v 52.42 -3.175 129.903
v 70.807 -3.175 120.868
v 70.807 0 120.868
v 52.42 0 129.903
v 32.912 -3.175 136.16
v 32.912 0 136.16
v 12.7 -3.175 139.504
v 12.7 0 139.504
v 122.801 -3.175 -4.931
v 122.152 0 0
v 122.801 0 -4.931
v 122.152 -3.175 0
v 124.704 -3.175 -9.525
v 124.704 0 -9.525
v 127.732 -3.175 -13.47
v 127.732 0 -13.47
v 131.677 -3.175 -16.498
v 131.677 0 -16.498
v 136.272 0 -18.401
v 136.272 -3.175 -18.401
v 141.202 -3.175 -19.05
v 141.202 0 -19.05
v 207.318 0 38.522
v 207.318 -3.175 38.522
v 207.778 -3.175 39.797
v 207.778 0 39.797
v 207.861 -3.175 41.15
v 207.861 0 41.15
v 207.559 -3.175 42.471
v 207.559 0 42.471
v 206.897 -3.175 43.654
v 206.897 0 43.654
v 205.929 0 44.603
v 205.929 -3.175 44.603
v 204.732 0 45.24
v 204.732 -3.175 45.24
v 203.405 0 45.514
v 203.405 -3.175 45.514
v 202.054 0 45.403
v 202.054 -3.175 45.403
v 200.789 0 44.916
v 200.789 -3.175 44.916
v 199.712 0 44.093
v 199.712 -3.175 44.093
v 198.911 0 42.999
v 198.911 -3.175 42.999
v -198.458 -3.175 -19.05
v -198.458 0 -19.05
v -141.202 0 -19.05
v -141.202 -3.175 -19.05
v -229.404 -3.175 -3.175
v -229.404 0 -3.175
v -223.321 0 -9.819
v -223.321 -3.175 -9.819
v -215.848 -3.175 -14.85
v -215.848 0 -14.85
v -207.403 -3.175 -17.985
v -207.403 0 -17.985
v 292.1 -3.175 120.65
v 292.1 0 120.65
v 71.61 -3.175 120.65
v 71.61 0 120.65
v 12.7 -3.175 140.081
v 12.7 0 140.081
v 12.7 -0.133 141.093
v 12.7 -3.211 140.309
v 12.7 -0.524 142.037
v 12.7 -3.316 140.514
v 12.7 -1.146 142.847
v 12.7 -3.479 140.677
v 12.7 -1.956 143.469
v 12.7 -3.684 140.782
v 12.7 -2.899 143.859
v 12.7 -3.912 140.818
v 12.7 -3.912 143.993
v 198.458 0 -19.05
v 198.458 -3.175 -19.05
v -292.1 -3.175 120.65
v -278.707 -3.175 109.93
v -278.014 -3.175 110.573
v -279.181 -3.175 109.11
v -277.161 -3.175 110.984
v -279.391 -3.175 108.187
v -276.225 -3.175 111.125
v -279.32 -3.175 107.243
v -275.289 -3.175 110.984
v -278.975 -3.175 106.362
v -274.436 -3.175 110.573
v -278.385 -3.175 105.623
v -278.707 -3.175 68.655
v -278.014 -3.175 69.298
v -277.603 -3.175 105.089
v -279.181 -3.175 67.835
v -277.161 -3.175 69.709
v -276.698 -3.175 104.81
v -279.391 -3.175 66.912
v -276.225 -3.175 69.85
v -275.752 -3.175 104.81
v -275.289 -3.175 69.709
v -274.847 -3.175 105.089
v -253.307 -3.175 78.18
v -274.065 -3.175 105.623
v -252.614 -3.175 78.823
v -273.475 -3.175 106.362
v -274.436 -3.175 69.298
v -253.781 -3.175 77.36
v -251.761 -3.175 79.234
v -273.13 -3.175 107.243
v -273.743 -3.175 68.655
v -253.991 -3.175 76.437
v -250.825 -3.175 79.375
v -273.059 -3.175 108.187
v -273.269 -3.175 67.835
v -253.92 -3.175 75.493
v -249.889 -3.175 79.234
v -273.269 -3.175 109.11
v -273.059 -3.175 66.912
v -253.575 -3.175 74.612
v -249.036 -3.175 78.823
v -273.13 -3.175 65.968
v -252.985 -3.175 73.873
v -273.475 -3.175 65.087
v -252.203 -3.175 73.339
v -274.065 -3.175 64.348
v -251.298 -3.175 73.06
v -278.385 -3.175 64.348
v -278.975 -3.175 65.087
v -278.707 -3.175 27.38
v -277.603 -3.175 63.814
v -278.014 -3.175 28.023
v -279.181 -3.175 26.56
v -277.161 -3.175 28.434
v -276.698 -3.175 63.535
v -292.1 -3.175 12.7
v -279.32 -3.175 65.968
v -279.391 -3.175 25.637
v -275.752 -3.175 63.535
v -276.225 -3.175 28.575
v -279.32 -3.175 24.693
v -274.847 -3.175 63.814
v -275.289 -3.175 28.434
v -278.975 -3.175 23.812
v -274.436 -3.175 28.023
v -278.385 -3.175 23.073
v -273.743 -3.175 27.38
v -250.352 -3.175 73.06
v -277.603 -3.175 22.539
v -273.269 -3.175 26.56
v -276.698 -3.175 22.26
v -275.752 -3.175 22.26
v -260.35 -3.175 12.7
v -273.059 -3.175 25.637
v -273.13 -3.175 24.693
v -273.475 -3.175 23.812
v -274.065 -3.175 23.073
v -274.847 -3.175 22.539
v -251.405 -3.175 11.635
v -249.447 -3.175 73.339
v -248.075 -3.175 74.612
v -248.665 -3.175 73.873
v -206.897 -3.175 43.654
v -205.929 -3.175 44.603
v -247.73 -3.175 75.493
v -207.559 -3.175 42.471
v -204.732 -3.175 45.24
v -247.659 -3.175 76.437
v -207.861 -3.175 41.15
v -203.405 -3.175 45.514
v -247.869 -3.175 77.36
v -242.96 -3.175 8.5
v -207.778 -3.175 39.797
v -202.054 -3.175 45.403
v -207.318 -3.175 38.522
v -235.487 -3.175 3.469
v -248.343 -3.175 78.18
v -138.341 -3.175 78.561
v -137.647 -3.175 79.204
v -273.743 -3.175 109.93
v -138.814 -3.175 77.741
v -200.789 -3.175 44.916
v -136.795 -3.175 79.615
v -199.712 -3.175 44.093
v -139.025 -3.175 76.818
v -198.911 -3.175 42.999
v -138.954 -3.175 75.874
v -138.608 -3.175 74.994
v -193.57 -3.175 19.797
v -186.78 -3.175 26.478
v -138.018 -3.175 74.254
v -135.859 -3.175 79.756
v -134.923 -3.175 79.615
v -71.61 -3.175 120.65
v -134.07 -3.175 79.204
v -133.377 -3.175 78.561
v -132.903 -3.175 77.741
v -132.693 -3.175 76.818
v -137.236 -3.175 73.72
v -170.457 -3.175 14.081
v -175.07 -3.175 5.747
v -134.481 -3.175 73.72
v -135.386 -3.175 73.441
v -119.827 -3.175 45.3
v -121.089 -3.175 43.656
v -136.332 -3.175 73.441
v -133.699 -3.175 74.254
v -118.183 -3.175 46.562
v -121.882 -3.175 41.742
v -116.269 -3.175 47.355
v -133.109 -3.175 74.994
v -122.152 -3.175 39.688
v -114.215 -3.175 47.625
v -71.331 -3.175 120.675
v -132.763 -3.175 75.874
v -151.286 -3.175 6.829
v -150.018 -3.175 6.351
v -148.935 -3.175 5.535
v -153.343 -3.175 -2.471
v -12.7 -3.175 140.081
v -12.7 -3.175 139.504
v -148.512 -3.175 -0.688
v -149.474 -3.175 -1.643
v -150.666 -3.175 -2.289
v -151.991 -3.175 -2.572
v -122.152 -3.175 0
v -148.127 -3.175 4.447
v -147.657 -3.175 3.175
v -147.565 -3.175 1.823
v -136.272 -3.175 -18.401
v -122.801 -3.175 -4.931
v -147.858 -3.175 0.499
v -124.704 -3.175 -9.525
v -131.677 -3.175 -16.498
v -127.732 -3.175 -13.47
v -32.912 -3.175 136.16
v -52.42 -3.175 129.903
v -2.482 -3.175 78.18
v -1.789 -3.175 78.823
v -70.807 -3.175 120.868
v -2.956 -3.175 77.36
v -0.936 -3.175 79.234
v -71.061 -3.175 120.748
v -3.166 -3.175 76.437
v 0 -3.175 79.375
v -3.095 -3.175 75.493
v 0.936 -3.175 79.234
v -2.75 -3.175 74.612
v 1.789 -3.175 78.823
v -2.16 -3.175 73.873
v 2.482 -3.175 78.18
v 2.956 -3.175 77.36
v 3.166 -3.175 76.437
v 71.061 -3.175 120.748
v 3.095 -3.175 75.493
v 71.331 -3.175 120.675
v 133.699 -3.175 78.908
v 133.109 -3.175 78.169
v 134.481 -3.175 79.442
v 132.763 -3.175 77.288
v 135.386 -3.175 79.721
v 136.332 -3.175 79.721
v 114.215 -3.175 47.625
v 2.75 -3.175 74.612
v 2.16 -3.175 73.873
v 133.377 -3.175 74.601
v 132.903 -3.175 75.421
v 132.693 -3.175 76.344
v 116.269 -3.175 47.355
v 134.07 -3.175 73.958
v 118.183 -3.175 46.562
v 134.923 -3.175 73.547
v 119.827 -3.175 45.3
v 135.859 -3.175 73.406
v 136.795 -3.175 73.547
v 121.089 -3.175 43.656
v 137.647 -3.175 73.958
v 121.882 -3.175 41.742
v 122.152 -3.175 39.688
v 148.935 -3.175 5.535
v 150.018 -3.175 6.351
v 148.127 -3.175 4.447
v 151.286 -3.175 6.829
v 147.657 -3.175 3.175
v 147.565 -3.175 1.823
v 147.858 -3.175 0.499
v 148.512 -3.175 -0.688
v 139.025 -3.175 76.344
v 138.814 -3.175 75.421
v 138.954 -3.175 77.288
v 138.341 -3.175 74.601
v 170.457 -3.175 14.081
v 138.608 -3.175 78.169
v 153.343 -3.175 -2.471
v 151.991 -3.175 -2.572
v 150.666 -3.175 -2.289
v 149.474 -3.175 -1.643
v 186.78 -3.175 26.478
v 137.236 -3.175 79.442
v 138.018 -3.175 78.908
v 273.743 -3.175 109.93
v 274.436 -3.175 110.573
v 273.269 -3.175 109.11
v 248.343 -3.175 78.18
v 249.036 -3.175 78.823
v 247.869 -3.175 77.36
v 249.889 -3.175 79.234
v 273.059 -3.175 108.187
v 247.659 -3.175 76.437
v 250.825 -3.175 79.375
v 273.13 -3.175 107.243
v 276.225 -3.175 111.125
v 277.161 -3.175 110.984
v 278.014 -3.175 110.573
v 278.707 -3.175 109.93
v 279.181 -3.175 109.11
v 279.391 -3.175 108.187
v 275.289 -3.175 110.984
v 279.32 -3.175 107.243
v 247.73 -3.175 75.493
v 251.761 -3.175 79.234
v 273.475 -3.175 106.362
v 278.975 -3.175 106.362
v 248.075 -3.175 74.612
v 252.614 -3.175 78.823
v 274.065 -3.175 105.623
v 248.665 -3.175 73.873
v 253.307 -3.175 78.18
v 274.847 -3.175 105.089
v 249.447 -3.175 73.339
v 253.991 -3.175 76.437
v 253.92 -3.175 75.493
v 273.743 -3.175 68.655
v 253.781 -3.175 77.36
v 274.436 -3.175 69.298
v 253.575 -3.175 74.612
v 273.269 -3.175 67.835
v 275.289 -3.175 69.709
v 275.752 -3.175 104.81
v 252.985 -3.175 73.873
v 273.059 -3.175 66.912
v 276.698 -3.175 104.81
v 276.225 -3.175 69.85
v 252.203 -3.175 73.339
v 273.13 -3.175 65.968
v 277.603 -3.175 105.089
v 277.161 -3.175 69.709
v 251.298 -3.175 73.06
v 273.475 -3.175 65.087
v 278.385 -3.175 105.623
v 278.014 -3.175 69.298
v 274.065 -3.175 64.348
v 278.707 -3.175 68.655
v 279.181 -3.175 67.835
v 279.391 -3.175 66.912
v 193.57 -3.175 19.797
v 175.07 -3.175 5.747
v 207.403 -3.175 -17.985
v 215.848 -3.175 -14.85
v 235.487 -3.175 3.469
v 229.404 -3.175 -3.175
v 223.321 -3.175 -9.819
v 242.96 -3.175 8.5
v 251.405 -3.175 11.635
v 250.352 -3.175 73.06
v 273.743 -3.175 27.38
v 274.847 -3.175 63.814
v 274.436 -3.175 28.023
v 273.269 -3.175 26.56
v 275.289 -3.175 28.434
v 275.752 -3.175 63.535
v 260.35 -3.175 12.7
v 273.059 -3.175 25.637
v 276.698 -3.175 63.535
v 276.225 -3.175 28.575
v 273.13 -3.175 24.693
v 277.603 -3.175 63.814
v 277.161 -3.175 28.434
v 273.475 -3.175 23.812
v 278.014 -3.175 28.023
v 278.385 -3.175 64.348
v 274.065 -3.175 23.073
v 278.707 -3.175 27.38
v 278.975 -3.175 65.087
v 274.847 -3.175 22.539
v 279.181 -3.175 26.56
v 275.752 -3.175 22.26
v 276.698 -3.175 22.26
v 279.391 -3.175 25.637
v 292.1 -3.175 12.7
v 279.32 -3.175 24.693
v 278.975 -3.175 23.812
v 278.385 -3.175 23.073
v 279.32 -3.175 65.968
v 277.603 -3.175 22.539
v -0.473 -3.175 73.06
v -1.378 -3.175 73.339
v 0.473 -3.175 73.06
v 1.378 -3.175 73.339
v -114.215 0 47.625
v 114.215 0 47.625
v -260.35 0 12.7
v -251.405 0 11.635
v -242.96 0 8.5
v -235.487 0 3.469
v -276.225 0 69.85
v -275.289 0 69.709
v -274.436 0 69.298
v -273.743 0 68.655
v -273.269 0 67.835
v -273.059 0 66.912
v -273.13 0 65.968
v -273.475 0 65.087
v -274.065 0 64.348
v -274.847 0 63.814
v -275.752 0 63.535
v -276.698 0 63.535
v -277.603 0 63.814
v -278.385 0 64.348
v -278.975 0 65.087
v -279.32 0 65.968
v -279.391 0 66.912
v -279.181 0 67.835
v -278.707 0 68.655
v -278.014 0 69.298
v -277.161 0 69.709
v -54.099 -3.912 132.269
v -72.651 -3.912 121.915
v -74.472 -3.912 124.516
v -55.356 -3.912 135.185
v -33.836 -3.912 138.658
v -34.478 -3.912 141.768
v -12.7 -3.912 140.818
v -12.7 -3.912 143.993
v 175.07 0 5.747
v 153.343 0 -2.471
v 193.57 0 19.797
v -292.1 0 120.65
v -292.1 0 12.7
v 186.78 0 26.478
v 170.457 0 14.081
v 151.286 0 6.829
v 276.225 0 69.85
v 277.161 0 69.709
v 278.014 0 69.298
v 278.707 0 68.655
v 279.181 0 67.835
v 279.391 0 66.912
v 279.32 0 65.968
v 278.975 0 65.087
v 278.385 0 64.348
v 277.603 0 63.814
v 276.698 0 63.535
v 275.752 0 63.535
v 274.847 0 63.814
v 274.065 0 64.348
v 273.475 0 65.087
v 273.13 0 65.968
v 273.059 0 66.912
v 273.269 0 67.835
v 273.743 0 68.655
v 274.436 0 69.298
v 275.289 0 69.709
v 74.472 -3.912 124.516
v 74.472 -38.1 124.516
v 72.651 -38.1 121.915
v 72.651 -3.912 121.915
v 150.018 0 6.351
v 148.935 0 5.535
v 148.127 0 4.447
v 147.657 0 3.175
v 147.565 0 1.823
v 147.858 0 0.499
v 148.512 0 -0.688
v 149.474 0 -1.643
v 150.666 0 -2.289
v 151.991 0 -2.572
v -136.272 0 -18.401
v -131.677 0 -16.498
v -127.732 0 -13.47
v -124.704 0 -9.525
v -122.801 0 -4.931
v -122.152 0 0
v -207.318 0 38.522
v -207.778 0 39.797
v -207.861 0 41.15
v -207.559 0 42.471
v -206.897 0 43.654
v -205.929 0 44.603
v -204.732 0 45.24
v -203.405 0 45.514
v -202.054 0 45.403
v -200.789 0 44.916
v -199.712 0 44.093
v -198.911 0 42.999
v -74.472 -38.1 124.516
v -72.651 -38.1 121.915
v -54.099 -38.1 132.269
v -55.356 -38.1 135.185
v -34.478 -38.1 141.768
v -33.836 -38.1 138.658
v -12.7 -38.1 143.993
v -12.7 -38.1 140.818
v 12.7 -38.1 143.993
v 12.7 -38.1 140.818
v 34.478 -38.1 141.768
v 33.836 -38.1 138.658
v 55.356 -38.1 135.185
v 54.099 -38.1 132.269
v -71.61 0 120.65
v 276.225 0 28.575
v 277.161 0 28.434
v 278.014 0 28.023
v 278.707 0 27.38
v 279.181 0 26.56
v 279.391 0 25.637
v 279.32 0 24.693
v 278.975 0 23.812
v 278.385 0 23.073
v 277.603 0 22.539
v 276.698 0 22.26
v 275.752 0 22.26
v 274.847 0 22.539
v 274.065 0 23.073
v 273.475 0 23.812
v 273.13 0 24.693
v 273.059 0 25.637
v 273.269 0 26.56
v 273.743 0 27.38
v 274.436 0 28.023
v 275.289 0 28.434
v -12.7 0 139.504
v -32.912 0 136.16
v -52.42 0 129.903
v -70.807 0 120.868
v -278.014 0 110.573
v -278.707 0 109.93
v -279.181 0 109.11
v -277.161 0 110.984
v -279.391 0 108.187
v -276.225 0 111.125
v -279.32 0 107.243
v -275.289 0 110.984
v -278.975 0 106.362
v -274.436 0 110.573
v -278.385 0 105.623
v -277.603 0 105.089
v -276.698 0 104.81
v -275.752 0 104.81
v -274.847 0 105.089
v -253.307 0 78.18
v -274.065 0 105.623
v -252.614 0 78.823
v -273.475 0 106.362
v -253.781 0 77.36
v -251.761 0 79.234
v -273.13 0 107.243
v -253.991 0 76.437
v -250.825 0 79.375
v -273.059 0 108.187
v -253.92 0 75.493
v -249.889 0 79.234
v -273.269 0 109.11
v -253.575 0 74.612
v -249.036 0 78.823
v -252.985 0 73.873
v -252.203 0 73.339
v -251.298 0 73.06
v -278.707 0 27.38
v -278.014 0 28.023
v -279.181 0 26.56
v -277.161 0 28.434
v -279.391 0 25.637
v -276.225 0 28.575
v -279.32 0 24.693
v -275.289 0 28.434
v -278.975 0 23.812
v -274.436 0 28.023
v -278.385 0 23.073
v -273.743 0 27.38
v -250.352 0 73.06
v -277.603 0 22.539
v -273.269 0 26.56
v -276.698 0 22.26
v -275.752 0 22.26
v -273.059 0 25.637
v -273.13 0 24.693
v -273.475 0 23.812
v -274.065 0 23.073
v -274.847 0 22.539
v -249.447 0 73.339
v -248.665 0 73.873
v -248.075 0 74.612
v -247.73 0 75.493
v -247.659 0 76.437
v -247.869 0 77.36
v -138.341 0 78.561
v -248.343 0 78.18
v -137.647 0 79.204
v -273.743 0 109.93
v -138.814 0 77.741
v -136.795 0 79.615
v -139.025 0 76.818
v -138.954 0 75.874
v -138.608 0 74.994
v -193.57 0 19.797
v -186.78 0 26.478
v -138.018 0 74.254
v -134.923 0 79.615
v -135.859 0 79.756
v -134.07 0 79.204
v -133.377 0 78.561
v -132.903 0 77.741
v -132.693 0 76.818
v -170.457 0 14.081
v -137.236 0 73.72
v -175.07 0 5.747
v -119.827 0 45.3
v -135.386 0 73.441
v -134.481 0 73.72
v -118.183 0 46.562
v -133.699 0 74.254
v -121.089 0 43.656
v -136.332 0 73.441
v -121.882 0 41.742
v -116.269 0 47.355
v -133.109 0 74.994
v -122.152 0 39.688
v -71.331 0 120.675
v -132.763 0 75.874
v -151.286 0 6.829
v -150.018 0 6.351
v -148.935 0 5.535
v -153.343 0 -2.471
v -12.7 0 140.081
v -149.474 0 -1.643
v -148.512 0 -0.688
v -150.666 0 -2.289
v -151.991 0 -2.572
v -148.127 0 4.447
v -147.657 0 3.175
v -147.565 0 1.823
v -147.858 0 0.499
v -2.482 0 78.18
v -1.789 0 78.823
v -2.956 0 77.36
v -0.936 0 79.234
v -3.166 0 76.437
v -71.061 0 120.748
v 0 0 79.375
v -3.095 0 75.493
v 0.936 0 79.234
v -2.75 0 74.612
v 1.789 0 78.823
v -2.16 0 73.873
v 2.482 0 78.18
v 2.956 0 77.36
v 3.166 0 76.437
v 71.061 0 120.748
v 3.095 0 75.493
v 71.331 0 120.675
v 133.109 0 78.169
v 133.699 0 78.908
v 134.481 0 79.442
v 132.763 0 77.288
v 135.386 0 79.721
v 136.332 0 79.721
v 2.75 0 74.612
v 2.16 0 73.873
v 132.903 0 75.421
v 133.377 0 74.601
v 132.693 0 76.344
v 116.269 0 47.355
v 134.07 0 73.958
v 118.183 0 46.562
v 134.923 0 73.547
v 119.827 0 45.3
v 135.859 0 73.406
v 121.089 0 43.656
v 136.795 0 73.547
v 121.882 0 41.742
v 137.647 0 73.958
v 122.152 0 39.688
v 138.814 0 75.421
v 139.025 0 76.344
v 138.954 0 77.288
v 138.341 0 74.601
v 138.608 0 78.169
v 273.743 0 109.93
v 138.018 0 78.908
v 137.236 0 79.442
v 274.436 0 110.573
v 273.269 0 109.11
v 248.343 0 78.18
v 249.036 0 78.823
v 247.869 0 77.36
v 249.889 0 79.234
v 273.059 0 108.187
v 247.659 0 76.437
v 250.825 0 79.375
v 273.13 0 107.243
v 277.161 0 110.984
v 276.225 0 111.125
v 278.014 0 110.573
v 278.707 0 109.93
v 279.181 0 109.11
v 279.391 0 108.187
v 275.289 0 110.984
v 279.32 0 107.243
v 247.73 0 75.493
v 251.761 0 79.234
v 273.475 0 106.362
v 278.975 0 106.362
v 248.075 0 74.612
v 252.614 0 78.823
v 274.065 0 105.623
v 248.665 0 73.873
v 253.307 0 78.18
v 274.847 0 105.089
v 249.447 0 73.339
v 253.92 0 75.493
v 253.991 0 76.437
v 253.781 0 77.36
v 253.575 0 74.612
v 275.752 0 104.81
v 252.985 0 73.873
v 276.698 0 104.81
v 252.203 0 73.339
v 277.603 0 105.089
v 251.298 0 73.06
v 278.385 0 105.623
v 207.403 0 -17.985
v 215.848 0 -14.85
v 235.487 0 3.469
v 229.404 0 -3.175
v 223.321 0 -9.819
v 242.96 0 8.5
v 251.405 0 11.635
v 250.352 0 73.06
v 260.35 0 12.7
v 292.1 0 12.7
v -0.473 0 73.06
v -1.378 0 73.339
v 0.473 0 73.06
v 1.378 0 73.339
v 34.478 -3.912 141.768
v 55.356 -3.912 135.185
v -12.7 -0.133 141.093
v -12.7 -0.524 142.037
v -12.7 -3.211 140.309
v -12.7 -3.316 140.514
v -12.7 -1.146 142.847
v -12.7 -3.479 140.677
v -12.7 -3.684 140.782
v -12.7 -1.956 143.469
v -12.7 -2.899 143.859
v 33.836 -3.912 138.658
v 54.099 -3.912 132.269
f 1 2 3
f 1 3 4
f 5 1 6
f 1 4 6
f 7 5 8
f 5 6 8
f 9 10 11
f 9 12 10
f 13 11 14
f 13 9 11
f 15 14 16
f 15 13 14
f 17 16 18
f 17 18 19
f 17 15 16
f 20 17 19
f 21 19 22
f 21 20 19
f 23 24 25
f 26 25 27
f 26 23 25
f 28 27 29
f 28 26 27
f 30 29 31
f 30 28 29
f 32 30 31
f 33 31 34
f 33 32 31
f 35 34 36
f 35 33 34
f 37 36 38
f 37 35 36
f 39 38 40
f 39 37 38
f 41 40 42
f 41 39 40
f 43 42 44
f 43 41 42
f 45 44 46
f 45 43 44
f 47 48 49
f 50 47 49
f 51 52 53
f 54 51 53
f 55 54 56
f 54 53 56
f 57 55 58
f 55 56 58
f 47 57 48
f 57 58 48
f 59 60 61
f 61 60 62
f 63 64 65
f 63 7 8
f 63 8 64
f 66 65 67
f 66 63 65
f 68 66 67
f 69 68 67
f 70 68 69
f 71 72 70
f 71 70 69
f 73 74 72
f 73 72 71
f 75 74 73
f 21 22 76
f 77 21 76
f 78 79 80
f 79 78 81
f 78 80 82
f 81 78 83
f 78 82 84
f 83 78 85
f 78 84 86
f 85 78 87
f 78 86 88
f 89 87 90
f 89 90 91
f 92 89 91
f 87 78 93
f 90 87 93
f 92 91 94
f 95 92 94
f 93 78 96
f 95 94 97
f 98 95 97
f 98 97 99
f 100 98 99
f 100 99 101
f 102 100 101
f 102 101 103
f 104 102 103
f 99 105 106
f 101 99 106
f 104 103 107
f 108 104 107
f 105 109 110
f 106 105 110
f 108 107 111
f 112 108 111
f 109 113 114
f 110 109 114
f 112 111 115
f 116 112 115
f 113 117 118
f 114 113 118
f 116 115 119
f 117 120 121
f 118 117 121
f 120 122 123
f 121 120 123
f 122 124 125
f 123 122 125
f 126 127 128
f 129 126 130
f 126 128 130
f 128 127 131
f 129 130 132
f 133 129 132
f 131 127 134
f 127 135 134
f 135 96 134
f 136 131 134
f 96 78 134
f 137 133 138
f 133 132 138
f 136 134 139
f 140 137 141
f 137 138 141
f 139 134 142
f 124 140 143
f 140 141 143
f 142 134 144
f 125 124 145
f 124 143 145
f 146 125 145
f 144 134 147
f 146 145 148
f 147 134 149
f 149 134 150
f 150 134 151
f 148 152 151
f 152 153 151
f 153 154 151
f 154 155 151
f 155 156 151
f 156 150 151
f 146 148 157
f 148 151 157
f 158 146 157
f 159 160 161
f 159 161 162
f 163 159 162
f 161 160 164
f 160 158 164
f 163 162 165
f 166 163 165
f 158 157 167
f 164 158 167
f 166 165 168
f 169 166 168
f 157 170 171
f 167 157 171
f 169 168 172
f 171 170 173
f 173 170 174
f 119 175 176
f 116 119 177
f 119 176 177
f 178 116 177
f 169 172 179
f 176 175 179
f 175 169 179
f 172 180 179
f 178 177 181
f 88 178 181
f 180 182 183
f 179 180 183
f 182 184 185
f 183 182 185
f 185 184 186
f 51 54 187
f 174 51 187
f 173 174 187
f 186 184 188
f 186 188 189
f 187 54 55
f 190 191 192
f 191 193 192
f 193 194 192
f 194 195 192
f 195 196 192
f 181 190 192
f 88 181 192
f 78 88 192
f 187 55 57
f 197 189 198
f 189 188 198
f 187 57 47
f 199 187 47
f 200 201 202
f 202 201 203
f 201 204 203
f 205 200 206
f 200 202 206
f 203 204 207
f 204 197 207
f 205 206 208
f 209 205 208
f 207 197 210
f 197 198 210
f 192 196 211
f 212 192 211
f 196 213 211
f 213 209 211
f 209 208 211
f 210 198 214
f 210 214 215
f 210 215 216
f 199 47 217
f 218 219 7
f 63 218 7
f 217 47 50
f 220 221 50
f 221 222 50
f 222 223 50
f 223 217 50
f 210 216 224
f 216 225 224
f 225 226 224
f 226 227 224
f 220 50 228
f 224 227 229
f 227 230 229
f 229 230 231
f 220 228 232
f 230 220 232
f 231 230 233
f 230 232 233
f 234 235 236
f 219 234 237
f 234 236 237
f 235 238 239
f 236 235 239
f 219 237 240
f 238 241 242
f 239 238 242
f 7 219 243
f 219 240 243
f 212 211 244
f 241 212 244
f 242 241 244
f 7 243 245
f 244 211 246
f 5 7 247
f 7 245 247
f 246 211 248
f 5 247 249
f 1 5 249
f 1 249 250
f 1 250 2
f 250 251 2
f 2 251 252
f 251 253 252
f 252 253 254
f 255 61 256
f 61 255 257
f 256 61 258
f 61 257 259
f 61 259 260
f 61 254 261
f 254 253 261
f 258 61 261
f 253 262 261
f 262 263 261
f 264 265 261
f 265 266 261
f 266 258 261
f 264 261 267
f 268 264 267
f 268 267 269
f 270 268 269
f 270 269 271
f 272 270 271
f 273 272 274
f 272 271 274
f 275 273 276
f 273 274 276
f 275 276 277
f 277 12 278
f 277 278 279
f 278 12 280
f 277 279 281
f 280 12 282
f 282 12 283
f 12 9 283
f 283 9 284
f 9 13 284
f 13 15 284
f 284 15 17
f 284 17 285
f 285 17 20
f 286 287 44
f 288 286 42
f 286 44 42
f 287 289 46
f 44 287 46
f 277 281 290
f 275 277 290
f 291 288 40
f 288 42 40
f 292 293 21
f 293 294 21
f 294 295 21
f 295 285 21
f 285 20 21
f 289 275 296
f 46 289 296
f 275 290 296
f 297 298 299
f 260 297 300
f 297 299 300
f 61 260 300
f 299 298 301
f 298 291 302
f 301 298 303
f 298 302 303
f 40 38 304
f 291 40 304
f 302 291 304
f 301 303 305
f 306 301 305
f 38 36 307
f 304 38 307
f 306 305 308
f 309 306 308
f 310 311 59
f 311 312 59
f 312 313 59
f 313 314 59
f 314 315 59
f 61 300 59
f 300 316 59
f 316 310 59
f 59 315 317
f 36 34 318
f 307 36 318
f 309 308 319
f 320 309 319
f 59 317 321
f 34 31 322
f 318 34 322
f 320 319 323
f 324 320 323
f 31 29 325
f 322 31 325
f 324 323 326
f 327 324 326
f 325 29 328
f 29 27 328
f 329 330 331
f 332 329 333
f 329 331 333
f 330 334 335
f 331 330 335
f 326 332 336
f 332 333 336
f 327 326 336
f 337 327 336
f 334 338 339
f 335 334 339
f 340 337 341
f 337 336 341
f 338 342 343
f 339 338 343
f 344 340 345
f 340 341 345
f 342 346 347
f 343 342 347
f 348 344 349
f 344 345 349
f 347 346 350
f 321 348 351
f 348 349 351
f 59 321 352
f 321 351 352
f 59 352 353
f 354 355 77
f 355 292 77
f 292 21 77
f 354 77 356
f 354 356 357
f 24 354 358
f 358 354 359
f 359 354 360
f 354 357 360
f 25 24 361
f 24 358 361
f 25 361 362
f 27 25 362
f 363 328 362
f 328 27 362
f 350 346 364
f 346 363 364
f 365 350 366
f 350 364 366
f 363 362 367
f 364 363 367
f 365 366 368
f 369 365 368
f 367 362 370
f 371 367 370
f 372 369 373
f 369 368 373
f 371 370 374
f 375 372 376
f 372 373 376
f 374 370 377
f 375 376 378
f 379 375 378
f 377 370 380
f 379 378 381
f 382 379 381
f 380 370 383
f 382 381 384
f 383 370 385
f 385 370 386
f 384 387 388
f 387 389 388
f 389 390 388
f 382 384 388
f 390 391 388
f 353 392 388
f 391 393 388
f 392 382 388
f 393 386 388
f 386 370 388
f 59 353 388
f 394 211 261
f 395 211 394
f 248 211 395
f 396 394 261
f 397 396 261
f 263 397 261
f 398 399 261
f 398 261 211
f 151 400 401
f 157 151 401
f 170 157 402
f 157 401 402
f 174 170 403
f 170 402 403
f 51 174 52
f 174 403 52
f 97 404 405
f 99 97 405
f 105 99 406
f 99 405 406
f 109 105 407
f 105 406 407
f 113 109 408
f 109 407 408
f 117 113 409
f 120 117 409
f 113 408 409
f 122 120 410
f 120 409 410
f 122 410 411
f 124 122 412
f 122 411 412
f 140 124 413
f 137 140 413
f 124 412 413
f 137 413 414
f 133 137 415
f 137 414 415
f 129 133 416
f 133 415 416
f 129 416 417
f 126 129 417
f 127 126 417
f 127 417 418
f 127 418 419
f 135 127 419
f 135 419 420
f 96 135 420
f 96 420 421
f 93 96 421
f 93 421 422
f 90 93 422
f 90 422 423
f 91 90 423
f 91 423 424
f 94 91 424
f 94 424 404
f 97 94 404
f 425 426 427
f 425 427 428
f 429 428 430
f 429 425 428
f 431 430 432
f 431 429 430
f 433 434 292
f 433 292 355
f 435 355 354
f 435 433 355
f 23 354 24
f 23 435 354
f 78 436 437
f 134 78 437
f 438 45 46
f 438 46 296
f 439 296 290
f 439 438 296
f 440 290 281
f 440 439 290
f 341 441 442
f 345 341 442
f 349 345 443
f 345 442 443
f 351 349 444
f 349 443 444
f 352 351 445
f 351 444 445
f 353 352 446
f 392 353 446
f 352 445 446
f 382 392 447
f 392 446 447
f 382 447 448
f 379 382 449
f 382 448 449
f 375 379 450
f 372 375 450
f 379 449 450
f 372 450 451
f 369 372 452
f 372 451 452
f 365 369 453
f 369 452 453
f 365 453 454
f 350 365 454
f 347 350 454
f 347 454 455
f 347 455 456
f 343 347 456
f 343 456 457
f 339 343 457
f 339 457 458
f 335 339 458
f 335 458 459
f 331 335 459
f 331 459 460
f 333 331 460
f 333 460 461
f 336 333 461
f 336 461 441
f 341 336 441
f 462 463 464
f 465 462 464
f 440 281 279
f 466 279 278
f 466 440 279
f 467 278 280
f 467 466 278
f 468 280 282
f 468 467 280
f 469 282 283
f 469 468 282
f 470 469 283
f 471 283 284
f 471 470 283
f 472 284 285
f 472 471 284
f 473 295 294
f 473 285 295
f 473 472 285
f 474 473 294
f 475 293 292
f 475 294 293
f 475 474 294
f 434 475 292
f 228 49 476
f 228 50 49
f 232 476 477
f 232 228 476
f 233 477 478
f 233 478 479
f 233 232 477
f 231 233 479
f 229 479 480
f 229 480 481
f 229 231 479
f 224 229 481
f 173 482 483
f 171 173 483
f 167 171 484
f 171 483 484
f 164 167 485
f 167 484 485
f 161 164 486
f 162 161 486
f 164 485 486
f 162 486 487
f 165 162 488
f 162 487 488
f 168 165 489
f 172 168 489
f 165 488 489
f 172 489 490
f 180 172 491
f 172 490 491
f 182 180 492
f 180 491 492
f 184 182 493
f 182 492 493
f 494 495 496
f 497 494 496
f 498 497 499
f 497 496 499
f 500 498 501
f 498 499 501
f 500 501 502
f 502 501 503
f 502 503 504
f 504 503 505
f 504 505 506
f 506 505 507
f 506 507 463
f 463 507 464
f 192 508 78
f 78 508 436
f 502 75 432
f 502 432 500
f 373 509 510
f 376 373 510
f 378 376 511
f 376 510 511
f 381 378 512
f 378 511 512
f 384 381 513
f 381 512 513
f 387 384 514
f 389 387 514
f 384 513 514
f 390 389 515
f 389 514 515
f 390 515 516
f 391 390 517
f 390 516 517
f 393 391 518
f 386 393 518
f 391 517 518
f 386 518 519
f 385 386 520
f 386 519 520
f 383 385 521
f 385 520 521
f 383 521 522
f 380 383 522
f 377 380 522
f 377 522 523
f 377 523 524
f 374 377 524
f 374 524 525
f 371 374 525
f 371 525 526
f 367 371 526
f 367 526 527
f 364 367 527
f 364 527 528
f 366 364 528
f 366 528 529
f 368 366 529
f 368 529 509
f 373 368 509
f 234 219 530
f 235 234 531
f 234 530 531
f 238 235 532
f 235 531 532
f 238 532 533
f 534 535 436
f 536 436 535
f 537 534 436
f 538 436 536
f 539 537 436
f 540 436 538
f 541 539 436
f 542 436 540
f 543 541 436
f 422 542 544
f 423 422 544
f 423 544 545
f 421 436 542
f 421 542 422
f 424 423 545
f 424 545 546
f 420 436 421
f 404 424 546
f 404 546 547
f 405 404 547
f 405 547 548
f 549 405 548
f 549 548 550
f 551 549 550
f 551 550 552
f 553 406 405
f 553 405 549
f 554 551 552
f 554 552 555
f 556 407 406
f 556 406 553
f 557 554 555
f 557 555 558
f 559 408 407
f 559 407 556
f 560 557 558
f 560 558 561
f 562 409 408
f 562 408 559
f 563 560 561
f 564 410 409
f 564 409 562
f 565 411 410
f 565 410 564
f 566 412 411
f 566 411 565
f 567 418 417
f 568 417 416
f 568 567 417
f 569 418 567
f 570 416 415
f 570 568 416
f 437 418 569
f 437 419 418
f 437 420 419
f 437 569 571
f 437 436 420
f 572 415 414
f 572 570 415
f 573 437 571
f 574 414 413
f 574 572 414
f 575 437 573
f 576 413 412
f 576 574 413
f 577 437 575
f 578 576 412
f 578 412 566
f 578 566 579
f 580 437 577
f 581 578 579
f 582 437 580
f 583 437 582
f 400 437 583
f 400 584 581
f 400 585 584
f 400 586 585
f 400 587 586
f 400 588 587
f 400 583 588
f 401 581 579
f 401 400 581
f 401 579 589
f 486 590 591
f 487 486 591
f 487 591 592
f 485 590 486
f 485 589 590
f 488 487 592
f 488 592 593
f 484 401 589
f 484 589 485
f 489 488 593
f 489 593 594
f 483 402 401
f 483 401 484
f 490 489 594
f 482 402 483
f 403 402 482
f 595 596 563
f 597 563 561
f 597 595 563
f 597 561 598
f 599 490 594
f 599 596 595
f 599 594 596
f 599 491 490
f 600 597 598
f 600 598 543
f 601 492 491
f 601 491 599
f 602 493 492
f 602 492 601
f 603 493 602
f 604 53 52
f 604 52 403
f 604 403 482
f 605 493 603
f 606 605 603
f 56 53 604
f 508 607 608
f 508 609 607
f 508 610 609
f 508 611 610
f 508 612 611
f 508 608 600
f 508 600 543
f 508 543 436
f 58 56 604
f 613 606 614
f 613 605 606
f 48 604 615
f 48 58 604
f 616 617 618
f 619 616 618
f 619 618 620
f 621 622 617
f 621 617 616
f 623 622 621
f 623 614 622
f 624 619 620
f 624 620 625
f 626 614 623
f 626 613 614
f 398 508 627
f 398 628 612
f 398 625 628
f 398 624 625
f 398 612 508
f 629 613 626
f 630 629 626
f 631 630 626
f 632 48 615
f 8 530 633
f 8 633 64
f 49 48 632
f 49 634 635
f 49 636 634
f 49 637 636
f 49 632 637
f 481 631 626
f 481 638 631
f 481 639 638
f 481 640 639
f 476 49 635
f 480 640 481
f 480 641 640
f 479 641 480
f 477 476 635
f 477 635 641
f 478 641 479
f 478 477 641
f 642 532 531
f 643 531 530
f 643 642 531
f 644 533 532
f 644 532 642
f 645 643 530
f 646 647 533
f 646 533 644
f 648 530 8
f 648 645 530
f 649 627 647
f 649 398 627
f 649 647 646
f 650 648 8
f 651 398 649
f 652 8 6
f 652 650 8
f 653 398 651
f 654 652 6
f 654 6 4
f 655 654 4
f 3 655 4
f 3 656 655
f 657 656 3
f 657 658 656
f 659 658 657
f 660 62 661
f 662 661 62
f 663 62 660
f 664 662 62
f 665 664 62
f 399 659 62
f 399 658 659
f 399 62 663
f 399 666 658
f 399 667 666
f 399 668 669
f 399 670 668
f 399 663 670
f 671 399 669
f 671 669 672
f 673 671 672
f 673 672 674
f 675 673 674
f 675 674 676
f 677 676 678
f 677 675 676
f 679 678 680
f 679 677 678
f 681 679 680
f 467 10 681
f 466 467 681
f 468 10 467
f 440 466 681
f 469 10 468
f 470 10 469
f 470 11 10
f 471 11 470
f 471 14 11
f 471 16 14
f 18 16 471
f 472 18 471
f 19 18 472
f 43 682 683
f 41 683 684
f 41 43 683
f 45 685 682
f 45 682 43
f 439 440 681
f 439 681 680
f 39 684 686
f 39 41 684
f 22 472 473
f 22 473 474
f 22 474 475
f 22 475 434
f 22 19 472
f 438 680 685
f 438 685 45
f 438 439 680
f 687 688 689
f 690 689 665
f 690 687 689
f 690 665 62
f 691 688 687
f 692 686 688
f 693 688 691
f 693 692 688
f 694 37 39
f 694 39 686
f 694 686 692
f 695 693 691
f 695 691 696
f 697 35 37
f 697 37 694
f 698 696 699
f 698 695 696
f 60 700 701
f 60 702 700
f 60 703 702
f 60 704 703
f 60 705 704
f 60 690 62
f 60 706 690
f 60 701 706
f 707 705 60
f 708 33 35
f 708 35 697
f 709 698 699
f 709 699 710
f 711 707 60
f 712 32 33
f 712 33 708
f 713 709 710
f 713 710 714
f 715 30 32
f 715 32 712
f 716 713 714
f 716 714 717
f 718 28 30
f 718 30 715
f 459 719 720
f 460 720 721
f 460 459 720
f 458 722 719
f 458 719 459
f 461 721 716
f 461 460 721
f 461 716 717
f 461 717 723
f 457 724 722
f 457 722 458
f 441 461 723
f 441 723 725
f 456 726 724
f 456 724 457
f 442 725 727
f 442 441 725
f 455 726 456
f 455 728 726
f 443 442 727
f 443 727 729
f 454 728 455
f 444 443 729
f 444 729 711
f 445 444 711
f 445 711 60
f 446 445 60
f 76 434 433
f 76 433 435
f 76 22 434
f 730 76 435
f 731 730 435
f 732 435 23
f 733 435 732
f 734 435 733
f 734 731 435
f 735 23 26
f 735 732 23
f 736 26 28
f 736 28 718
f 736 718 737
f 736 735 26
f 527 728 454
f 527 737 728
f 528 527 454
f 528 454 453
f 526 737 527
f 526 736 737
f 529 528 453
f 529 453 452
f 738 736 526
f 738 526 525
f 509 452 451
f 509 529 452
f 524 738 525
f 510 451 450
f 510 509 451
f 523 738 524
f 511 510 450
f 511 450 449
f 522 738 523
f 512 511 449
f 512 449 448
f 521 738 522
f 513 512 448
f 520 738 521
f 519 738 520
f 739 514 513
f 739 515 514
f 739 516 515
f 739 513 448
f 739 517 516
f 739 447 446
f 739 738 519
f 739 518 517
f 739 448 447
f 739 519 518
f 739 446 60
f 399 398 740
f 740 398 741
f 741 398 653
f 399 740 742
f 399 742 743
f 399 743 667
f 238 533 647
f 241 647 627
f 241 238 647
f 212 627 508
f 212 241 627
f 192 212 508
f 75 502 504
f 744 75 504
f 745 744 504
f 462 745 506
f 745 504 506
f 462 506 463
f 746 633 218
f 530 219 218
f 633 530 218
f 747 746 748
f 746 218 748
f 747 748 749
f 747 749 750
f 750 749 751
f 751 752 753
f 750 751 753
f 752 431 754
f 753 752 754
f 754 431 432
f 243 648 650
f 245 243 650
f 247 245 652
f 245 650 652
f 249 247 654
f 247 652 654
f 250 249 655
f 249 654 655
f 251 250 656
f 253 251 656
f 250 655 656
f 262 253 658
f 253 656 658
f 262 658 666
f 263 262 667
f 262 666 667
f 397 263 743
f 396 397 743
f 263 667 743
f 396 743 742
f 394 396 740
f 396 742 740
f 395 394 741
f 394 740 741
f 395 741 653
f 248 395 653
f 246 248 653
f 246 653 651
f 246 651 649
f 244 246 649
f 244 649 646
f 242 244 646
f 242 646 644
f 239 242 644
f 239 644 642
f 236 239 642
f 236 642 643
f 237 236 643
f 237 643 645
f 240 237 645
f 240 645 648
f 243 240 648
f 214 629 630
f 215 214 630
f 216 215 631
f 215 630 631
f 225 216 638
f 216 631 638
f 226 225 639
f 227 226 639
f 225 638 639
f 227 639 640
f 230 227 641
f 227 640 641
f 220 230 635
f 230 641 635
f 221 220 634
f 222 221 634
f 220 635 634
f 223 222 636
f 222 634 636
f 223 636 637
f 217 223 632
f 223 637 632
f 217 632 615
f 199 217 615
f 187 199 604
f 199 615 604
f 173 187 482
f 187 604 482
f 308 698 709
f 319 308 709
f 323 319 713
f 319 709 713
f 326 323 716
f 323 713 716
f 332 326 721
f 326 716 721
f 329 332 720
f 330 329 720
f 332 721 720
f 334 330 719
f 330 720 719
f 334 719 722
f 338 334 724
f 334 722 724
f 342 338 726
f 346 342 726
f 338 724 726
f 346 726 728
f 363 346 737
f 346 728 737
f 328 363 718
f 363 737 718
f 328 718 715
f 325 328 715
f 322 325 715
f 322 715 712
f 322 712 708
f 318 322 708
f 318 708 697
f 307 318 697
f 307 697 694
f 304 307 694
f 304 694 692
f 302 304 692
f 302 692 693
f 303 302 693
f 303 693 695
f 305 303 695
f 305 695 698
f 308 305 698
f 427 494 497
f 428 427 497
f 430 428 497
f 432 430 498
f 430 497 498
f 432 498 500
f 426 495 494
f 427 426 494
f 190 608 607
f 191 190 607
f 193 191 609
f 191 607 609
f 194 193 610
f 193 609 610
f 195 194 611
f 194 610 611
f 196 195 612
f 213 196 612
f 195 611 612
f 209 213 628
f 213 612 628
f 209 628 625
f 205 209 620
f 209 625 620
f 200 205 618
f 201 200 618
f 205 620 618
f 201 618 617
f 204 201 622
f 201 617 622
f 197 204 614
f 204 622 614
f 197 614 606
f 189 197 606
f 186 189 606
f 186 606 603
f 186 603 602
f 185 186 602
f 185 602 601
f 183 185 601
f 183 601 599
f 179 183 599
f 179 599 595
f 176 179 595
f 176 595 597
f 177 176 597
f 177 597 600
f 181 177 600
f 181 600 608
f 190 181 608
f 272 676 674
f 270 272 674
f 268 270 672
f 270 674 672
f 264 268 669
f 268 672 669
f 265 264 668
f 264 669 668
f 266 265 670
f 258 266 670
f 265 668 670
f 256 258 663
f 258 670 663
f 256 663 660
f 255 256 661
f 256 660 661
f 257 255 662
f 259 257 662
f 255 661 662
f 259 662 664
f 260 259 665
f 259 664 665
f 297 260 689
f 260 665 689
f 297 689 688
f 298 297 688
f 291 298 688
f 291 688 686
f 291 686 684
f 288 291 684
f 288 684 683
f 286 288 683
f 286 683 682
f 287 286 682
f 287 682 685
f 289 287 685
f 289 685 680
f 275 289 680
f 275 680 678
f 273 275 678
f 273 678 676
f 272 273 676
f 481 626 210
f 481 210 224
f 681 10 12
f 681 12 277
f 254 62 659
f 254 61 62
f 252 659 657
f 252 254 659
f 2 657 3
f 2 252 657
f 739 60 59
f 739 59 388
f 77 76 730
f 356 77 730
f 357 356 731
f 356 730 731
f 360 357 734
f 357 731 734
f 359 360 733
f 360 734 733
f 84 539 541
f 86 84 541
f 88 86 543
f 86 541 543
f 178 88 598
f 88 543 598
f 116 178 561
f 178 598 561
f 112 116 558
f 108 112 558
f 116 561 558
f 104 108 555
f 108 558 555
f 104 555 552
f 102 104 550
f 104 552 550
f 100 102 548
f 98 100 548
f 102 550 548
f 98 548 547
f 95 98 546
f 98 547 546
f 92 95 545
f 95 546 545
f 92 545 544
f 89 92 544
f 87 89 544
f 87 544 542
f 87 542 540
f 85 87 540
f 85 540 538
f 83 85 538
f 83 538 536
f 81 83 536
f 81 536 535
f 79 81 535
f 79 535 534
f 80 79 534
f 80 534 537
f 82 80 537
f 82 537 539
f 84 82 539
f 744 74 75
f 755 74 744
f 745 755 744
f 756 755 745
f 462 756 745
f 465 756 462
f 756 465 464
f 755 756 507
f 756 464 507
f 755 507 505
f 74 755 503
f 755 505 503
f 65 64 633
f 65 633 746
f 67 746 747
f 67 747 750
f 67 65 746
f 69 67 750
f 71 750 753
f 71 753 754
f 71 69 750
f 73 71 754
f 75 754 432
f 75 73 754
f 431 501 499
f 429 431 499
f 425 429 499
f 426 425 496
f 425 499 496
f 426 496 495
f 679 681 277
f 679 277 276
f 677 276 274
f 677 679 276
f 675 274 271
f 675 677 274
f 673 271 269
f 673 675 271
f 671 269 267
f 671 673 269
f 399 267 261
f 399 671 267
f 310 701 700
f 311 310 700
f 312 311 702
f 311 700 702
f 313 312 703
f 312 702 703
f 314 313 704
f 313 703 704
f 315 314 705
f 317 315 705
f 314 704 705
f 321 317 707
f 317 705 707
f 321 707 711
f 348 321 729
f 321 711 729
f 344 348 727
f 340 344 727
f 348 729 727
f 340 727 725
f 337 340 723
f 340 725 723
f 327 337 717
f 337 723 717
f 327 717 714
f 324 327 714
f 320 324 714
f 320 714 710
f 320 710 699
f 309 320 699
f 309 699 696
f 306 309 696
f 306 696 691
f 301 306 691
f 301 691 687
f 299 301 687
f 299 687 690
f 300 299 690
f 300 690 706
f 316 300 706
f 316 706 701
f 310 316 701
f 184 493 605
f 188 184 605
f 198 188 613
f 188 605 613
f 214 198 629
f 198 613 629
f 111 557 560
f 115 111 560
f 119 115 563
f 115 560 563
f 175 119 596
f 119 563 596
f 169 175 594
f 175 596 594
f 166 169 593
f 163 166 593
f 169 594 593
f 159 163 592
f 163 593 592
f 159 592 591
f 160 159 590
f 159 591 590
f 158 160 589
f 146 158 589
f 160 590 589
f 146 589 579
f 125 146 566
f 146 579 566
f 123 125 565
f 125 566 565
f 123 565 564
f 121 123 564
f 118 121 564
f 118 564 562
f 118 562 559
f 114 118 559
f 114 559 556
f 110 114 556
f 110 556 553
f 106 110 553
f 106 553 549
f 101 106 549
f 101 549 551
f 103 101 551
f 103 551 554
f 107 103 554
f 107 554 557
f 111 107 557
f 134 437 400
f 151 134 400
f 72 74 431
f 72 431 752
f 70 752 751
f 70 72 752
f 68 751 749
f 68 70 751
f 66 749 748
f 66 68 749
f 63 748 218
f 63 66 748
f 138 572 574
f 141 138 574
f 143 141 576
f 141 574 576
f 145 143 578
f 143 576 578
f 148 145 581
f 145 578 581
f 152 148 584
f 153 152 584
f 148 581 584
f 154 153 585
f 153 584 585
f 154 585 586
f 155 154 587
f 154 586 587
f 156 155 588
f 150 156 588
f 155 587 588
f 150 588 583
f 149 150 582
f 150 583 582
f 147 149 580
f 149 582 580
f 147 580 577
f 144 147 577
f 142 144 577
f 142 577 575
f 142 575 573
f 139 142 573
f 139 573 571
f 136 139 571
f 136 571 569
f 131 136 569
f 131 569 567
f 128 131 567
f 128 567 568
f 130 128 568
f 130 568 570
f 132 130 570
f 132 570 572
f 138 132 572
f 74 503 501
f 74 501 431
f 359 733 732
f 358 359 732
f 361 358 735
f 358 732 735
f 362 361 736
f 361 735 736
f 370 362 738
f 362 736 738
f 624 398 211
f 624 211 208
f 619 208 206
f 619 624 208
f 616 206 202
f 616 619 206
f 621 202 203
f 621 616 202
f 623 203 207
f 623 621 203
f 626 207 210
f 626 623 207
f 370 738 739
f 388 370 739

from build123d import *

# Parameters (mm, degrees)
SKETCH1_W          = 584.2
SKETCH1_H          = 304.8
BASE_FLANGE1_DEPTH = 3.175
SKETCH6_R          = 3.175
CUT_EXTRUDE1_DEPTH = 340.318162239
CUT_EXTRUDE2_DEPTH = 340.318162239
EDGE_FLANGE1_DEPTH = 25.4
HEM1_START         = -38.1
HEM1_DEPTH         = 34.1884
FILLET1_R          = 1.5875
SKETCH16_R         = 3.175
CUT_EXTRUDE3_DEPTH = 328.883956385
CUT_EXTRUDE4_DEPTH = 328.883956385
FILLET3_R          = 19.05


# Read off the part's stored shape, not the designer's step: Hem1
# Sheet-metal steps are written as plain solids
with BuildPart() as part:
    # Sketch1 → Base-Flange1 (new body)
    with BuildSketch(Plane(origin=(0, 0, 0), x_dir=(1, 0, 0), z_dir=(0, 1, 0))):
        with Locations((0, -20.239290429)):
            Rectangle(SKETCH1_W, SKETCH1_H)
    extrude(amount=-BASE_FLANGE1_DEPTH)

    # Sketch6 → Cut-Extrude1 (cut, through all)
    with BuildSketch(Plane(origin=(0, 0, 0), x_dir=(1, 0, 0), z_dir=(0, 1, 0))):
        with Locations(Location((-135.858839885, -76.581, 0), (0, 0, 270))):
            Circle(SKETCH6_R)
        with Locations(Location((135.858839885, -76.581, 0), (0, 0, 90))):
            Circle(SKETCH6_R)
        with BuildLine():
            ThreePointArc((-153.343024391, 2.471069539), (-184.826505048, -12.105468402), (-207.318024391, -38.521686343))
            ThreePointArc((-207.318024391, -38.521686343), (-205.353326106, -44.963950941), (-198.911061508, -42.999252655))
            ThreePointArc((-198.911061508, -42.999252655), (-179.065603264, -19.690825061), (-151.286061508, -6.829173936))
            ThreePointArc((-151.286061508, -6.829173936), (-147.664421212, -1.150570757), (-153.343024391, 2.471069539))
        make_face()
        with BuildLine():
            ThreePointArc((153.343024391, 2.471069539), (184.826505048, -12.105468402), (207.318024391, -38.521686343))
            ThreePointArc((207.318024391, -38.521686343), (205.353326106, -44.963950941), (198.911061508, -42.999252655))
            ThreePointArc((198.911061508, -42.999252655), (179.065603264, -19.690825061), (151.286061508, -6.829173936))
            ThreePointArc((151.286061508, -6.829173936), (147.664421212, -1.150570757), (153.343024391, 2.471069539))
        make_face()
    extrude(amount=-CUT_EXTRUDE1_DEPTH, mode=Mode.SUBTRACT)

    # Sketch7 → Cut-Extrude2 (cut, through all)
    with BuildSketch(Plane(origin=(0, 0, 0), x_dir=(1, 0, 0), z_dir=(0, 1, 0))):
        with BuildLine():
            Line((292.1, -120.65), (260.35, -120.65))
            Line((260.35, -120.65), (71.177693563, -120.65))
            ThreePointArc((71.177693563, -120.65), (42.985302493, -133.322729985), (12.7, -139.504109477))
            Line((12.7, -139.504109477), (12.7, -140.081))
            Line((12.7, -140.081), (-12.7, -140.081))
            Line((-12.7, -140.081), (-12.7, -139.504109477))
            ThreePointArc((-12.7, -139.504109477), (-42.985302493, -133.322729985), (-71.177693563, -120.65))
            Line((-71.177693563, -120.65), (-260.35, -120.65))
            Line((-260.35, -120.65), (-292.1, -120.65))
            Line((-292.1, -120.65), (-292.1, -172.639290429))
            Line((-292.1, -172.639290429), (292.1, -172.639290429))
            Line((292.1, -172.639290429), (292.1, -120.65))
        make_face()
        with BuildLine():
            Line((260.35, -12.7), (292.1, -12.7))
            Line((292.1, -12.7), (292.1, 132.160709571))
            Line((292.1, 132.160709571), (-292.1, 132.160709571))
            Line((-292.1, 132.160709571), (-292.1, -12.7))
            Line((-292.1, -12.7), (-260.35, -12.7))
            ThreePointArc((-260.35, -12.7), (-242.959808799, -8.49972345), (-229.403927955, 3.175))
            ThreePointArc((-229.403927955, 3.175), (-215.848047111, 14.84972345), (-198.45785591, 19.05))
            Line((-198.45785591, 19.05), (198.45785591, 19.05))
            ThreePointArc((198.45785591, 19.05), (215.848047111, 14.84972345), (229.403927955, 3.175))
            ThreePointArc((229.403927955, 3.175), (242.959808799, -8.49972345), (260.35, -12.7))
        make_face()
    extrude(amount=-CUT_EXTRUDE2_DEPTH, mode=Mode.SUBTRACT)

    # Edge-Flange1 section (across the edge) → Edge-Flange1 (add)
    with BuildSketch(Plane(origin=(12.7, -3.175, 140.8176), x_dir=(0, 0, -1), z_dir=(-1, 0, 0))):
        with BuildLine():
            Line((-3.175, 0.7366), (-3.175, 34.925))
            Line((-3.175, 34.925), (0, 34.925))
            Line((0, 34.925), (0, 0.7366))
            ThreePointArc((0, 0.7366), (0.215745145, 0.215745145), (0.7366, 0))
            Line((0.7366, 0), (0.7366, -3.175))
            ThreePointArc((0.7366, -3.175), (-2.029318885, -2.029318885), (-3.175, 0.7366))
        make_face()
    extrude(amount=EDGE_FLANGE1_DEPTH)

    # Hem1 outline → Hem1 (add)
    with BuildSketch(Plane(origin=(0, 0, 0), x_dir=(1, 0, 0), z_dir=(0, 1, 0)).offset(HEM1_START)):
        with BuildLine():
            Line((-72.650782704, -121.915190821), (-74.471887889, -124.515998562))
            ThreePointArc((-74.471887889, -124.515998562), (-45.084811783, -139.008100728), (-12.7, -143.9926))
            Line((-12.7, -143.9926), (-12.7, -140.8176))
            ThreePointArc((-12.7, -140.8176), (-44.13007087, -135.980049409), (-72.650782704, -121.915190821))
        make_face()
        with BuildLine():
            Line((74.471887889, -124.515998562), (72.650782704, -121.915190821))
            ThreePointArc((72.650782704, -121.915190821), (44.13007087, -135.980049409), (12.7, -140.8176))
            Line((12.7, -140.8176), (12.7, -143.9926))
            ThreePointArc((12.7, -143.9926), (45.084811783, -139.008100728), (74.471887889, -124.515998562))
        make_face()
    extrude(amount=HEM1_DEPTH)

    # Fillet1
    fillet1_edges = [part.edges().sort_by_distance(p)[0] for p in [
        (-71.177693563, -1.5875, 120.65),
        (71.177693563, -1.5875, 120.65),
    ]]
    fillet(fillet1_edges, radius=FILLET1_R)

    # Sketch16 → Cut-Extrude3 (cut, through all)
    with BuildSketch(Plane(origin=(0, 0, 0), x_dir=(1, 0, 0), z_dir=(0, 1, 0))):
        with Locations(Location((0, -76.2, 0), (0, 0, 270))):
            Circle(SKETCH16_R)
        with Locations(Location((-276.225, -25.4, 0), (0, 0, 270))):
            Circle(SKETCH16_R)
        with Locations(Location((-276.225, -107.95, 0), (0, 0, 270))):
            Circle(SKETCH16_R)
        with Locations(Location((-250.825, -76.2, 0), (0, 0, 270))):
            Circle(SKETCH16_R)
        with Locations(Location((276.225, -66.675, 0), (0, 0, 270))):
            Circle(SKETCH16_R)
        with Locations(Location((-276.225, -66.675, 0), (0, 0, 270))):
            Circle(SKETCH16_R)
        with Locations(Location((276.225, -107.95, 0), (0, 0, 270))):
            Circle(SKETCH16_R)
        with Locations(Location((276.225, -25.4, 0), (0, 0, 270))):
            Circle(SKETCH16_R)
        with Locations(Location((250.825, -76.2, 0), (0, 0, 270))):
            Circle(SKETCH16_R)
    extrude(amount=-CUT_EXTRUDE3_DEPTH, mode=Mode.SUBTRACT)

    # Sketch17 → Cut-Extrude4 (cut, through all)
    with BuildSketch(Plane(origin=(0, 0, 0), x_dir=(1, 0, 0), z_dir=(0, 1, 0))):
        with BuildLine():
            Line((-122.152042949, 19.05), (122.152042949, 19.05))
            Line((122.152042949, 19.05), (122.152042949, -39.6875))
            ThreePointArc((122.152042949, -39.6875), (119.827203025, -45.300160076), (114.214542949, -47.625))
            Line((114.214542949, -47.625), (-114.214542949, -47.625))
            ThreePointArc((-114.214542949, -47.625), (-119.827203025, -45.300160076), (-122.152042949, -39.6875))
            Line((-122.152042949, -39.6875), (-122.152042949, 19.05))
        make_face()
    extrude(amount=-CUT_EXTRUDE4_DEPTH, mode=Mode.SUBTRACT)

    # Fillet3
    fillet3_edges = [part.edges().sort_by_distance(p)[0] for p in [
        (122.152042949, -1.5875, -19.05),
        (-122.152042949, -1.5875, -19.05),
    ]]
    fillet(fillet3_edges, radius=FILLET3_R)


solid = part.part
